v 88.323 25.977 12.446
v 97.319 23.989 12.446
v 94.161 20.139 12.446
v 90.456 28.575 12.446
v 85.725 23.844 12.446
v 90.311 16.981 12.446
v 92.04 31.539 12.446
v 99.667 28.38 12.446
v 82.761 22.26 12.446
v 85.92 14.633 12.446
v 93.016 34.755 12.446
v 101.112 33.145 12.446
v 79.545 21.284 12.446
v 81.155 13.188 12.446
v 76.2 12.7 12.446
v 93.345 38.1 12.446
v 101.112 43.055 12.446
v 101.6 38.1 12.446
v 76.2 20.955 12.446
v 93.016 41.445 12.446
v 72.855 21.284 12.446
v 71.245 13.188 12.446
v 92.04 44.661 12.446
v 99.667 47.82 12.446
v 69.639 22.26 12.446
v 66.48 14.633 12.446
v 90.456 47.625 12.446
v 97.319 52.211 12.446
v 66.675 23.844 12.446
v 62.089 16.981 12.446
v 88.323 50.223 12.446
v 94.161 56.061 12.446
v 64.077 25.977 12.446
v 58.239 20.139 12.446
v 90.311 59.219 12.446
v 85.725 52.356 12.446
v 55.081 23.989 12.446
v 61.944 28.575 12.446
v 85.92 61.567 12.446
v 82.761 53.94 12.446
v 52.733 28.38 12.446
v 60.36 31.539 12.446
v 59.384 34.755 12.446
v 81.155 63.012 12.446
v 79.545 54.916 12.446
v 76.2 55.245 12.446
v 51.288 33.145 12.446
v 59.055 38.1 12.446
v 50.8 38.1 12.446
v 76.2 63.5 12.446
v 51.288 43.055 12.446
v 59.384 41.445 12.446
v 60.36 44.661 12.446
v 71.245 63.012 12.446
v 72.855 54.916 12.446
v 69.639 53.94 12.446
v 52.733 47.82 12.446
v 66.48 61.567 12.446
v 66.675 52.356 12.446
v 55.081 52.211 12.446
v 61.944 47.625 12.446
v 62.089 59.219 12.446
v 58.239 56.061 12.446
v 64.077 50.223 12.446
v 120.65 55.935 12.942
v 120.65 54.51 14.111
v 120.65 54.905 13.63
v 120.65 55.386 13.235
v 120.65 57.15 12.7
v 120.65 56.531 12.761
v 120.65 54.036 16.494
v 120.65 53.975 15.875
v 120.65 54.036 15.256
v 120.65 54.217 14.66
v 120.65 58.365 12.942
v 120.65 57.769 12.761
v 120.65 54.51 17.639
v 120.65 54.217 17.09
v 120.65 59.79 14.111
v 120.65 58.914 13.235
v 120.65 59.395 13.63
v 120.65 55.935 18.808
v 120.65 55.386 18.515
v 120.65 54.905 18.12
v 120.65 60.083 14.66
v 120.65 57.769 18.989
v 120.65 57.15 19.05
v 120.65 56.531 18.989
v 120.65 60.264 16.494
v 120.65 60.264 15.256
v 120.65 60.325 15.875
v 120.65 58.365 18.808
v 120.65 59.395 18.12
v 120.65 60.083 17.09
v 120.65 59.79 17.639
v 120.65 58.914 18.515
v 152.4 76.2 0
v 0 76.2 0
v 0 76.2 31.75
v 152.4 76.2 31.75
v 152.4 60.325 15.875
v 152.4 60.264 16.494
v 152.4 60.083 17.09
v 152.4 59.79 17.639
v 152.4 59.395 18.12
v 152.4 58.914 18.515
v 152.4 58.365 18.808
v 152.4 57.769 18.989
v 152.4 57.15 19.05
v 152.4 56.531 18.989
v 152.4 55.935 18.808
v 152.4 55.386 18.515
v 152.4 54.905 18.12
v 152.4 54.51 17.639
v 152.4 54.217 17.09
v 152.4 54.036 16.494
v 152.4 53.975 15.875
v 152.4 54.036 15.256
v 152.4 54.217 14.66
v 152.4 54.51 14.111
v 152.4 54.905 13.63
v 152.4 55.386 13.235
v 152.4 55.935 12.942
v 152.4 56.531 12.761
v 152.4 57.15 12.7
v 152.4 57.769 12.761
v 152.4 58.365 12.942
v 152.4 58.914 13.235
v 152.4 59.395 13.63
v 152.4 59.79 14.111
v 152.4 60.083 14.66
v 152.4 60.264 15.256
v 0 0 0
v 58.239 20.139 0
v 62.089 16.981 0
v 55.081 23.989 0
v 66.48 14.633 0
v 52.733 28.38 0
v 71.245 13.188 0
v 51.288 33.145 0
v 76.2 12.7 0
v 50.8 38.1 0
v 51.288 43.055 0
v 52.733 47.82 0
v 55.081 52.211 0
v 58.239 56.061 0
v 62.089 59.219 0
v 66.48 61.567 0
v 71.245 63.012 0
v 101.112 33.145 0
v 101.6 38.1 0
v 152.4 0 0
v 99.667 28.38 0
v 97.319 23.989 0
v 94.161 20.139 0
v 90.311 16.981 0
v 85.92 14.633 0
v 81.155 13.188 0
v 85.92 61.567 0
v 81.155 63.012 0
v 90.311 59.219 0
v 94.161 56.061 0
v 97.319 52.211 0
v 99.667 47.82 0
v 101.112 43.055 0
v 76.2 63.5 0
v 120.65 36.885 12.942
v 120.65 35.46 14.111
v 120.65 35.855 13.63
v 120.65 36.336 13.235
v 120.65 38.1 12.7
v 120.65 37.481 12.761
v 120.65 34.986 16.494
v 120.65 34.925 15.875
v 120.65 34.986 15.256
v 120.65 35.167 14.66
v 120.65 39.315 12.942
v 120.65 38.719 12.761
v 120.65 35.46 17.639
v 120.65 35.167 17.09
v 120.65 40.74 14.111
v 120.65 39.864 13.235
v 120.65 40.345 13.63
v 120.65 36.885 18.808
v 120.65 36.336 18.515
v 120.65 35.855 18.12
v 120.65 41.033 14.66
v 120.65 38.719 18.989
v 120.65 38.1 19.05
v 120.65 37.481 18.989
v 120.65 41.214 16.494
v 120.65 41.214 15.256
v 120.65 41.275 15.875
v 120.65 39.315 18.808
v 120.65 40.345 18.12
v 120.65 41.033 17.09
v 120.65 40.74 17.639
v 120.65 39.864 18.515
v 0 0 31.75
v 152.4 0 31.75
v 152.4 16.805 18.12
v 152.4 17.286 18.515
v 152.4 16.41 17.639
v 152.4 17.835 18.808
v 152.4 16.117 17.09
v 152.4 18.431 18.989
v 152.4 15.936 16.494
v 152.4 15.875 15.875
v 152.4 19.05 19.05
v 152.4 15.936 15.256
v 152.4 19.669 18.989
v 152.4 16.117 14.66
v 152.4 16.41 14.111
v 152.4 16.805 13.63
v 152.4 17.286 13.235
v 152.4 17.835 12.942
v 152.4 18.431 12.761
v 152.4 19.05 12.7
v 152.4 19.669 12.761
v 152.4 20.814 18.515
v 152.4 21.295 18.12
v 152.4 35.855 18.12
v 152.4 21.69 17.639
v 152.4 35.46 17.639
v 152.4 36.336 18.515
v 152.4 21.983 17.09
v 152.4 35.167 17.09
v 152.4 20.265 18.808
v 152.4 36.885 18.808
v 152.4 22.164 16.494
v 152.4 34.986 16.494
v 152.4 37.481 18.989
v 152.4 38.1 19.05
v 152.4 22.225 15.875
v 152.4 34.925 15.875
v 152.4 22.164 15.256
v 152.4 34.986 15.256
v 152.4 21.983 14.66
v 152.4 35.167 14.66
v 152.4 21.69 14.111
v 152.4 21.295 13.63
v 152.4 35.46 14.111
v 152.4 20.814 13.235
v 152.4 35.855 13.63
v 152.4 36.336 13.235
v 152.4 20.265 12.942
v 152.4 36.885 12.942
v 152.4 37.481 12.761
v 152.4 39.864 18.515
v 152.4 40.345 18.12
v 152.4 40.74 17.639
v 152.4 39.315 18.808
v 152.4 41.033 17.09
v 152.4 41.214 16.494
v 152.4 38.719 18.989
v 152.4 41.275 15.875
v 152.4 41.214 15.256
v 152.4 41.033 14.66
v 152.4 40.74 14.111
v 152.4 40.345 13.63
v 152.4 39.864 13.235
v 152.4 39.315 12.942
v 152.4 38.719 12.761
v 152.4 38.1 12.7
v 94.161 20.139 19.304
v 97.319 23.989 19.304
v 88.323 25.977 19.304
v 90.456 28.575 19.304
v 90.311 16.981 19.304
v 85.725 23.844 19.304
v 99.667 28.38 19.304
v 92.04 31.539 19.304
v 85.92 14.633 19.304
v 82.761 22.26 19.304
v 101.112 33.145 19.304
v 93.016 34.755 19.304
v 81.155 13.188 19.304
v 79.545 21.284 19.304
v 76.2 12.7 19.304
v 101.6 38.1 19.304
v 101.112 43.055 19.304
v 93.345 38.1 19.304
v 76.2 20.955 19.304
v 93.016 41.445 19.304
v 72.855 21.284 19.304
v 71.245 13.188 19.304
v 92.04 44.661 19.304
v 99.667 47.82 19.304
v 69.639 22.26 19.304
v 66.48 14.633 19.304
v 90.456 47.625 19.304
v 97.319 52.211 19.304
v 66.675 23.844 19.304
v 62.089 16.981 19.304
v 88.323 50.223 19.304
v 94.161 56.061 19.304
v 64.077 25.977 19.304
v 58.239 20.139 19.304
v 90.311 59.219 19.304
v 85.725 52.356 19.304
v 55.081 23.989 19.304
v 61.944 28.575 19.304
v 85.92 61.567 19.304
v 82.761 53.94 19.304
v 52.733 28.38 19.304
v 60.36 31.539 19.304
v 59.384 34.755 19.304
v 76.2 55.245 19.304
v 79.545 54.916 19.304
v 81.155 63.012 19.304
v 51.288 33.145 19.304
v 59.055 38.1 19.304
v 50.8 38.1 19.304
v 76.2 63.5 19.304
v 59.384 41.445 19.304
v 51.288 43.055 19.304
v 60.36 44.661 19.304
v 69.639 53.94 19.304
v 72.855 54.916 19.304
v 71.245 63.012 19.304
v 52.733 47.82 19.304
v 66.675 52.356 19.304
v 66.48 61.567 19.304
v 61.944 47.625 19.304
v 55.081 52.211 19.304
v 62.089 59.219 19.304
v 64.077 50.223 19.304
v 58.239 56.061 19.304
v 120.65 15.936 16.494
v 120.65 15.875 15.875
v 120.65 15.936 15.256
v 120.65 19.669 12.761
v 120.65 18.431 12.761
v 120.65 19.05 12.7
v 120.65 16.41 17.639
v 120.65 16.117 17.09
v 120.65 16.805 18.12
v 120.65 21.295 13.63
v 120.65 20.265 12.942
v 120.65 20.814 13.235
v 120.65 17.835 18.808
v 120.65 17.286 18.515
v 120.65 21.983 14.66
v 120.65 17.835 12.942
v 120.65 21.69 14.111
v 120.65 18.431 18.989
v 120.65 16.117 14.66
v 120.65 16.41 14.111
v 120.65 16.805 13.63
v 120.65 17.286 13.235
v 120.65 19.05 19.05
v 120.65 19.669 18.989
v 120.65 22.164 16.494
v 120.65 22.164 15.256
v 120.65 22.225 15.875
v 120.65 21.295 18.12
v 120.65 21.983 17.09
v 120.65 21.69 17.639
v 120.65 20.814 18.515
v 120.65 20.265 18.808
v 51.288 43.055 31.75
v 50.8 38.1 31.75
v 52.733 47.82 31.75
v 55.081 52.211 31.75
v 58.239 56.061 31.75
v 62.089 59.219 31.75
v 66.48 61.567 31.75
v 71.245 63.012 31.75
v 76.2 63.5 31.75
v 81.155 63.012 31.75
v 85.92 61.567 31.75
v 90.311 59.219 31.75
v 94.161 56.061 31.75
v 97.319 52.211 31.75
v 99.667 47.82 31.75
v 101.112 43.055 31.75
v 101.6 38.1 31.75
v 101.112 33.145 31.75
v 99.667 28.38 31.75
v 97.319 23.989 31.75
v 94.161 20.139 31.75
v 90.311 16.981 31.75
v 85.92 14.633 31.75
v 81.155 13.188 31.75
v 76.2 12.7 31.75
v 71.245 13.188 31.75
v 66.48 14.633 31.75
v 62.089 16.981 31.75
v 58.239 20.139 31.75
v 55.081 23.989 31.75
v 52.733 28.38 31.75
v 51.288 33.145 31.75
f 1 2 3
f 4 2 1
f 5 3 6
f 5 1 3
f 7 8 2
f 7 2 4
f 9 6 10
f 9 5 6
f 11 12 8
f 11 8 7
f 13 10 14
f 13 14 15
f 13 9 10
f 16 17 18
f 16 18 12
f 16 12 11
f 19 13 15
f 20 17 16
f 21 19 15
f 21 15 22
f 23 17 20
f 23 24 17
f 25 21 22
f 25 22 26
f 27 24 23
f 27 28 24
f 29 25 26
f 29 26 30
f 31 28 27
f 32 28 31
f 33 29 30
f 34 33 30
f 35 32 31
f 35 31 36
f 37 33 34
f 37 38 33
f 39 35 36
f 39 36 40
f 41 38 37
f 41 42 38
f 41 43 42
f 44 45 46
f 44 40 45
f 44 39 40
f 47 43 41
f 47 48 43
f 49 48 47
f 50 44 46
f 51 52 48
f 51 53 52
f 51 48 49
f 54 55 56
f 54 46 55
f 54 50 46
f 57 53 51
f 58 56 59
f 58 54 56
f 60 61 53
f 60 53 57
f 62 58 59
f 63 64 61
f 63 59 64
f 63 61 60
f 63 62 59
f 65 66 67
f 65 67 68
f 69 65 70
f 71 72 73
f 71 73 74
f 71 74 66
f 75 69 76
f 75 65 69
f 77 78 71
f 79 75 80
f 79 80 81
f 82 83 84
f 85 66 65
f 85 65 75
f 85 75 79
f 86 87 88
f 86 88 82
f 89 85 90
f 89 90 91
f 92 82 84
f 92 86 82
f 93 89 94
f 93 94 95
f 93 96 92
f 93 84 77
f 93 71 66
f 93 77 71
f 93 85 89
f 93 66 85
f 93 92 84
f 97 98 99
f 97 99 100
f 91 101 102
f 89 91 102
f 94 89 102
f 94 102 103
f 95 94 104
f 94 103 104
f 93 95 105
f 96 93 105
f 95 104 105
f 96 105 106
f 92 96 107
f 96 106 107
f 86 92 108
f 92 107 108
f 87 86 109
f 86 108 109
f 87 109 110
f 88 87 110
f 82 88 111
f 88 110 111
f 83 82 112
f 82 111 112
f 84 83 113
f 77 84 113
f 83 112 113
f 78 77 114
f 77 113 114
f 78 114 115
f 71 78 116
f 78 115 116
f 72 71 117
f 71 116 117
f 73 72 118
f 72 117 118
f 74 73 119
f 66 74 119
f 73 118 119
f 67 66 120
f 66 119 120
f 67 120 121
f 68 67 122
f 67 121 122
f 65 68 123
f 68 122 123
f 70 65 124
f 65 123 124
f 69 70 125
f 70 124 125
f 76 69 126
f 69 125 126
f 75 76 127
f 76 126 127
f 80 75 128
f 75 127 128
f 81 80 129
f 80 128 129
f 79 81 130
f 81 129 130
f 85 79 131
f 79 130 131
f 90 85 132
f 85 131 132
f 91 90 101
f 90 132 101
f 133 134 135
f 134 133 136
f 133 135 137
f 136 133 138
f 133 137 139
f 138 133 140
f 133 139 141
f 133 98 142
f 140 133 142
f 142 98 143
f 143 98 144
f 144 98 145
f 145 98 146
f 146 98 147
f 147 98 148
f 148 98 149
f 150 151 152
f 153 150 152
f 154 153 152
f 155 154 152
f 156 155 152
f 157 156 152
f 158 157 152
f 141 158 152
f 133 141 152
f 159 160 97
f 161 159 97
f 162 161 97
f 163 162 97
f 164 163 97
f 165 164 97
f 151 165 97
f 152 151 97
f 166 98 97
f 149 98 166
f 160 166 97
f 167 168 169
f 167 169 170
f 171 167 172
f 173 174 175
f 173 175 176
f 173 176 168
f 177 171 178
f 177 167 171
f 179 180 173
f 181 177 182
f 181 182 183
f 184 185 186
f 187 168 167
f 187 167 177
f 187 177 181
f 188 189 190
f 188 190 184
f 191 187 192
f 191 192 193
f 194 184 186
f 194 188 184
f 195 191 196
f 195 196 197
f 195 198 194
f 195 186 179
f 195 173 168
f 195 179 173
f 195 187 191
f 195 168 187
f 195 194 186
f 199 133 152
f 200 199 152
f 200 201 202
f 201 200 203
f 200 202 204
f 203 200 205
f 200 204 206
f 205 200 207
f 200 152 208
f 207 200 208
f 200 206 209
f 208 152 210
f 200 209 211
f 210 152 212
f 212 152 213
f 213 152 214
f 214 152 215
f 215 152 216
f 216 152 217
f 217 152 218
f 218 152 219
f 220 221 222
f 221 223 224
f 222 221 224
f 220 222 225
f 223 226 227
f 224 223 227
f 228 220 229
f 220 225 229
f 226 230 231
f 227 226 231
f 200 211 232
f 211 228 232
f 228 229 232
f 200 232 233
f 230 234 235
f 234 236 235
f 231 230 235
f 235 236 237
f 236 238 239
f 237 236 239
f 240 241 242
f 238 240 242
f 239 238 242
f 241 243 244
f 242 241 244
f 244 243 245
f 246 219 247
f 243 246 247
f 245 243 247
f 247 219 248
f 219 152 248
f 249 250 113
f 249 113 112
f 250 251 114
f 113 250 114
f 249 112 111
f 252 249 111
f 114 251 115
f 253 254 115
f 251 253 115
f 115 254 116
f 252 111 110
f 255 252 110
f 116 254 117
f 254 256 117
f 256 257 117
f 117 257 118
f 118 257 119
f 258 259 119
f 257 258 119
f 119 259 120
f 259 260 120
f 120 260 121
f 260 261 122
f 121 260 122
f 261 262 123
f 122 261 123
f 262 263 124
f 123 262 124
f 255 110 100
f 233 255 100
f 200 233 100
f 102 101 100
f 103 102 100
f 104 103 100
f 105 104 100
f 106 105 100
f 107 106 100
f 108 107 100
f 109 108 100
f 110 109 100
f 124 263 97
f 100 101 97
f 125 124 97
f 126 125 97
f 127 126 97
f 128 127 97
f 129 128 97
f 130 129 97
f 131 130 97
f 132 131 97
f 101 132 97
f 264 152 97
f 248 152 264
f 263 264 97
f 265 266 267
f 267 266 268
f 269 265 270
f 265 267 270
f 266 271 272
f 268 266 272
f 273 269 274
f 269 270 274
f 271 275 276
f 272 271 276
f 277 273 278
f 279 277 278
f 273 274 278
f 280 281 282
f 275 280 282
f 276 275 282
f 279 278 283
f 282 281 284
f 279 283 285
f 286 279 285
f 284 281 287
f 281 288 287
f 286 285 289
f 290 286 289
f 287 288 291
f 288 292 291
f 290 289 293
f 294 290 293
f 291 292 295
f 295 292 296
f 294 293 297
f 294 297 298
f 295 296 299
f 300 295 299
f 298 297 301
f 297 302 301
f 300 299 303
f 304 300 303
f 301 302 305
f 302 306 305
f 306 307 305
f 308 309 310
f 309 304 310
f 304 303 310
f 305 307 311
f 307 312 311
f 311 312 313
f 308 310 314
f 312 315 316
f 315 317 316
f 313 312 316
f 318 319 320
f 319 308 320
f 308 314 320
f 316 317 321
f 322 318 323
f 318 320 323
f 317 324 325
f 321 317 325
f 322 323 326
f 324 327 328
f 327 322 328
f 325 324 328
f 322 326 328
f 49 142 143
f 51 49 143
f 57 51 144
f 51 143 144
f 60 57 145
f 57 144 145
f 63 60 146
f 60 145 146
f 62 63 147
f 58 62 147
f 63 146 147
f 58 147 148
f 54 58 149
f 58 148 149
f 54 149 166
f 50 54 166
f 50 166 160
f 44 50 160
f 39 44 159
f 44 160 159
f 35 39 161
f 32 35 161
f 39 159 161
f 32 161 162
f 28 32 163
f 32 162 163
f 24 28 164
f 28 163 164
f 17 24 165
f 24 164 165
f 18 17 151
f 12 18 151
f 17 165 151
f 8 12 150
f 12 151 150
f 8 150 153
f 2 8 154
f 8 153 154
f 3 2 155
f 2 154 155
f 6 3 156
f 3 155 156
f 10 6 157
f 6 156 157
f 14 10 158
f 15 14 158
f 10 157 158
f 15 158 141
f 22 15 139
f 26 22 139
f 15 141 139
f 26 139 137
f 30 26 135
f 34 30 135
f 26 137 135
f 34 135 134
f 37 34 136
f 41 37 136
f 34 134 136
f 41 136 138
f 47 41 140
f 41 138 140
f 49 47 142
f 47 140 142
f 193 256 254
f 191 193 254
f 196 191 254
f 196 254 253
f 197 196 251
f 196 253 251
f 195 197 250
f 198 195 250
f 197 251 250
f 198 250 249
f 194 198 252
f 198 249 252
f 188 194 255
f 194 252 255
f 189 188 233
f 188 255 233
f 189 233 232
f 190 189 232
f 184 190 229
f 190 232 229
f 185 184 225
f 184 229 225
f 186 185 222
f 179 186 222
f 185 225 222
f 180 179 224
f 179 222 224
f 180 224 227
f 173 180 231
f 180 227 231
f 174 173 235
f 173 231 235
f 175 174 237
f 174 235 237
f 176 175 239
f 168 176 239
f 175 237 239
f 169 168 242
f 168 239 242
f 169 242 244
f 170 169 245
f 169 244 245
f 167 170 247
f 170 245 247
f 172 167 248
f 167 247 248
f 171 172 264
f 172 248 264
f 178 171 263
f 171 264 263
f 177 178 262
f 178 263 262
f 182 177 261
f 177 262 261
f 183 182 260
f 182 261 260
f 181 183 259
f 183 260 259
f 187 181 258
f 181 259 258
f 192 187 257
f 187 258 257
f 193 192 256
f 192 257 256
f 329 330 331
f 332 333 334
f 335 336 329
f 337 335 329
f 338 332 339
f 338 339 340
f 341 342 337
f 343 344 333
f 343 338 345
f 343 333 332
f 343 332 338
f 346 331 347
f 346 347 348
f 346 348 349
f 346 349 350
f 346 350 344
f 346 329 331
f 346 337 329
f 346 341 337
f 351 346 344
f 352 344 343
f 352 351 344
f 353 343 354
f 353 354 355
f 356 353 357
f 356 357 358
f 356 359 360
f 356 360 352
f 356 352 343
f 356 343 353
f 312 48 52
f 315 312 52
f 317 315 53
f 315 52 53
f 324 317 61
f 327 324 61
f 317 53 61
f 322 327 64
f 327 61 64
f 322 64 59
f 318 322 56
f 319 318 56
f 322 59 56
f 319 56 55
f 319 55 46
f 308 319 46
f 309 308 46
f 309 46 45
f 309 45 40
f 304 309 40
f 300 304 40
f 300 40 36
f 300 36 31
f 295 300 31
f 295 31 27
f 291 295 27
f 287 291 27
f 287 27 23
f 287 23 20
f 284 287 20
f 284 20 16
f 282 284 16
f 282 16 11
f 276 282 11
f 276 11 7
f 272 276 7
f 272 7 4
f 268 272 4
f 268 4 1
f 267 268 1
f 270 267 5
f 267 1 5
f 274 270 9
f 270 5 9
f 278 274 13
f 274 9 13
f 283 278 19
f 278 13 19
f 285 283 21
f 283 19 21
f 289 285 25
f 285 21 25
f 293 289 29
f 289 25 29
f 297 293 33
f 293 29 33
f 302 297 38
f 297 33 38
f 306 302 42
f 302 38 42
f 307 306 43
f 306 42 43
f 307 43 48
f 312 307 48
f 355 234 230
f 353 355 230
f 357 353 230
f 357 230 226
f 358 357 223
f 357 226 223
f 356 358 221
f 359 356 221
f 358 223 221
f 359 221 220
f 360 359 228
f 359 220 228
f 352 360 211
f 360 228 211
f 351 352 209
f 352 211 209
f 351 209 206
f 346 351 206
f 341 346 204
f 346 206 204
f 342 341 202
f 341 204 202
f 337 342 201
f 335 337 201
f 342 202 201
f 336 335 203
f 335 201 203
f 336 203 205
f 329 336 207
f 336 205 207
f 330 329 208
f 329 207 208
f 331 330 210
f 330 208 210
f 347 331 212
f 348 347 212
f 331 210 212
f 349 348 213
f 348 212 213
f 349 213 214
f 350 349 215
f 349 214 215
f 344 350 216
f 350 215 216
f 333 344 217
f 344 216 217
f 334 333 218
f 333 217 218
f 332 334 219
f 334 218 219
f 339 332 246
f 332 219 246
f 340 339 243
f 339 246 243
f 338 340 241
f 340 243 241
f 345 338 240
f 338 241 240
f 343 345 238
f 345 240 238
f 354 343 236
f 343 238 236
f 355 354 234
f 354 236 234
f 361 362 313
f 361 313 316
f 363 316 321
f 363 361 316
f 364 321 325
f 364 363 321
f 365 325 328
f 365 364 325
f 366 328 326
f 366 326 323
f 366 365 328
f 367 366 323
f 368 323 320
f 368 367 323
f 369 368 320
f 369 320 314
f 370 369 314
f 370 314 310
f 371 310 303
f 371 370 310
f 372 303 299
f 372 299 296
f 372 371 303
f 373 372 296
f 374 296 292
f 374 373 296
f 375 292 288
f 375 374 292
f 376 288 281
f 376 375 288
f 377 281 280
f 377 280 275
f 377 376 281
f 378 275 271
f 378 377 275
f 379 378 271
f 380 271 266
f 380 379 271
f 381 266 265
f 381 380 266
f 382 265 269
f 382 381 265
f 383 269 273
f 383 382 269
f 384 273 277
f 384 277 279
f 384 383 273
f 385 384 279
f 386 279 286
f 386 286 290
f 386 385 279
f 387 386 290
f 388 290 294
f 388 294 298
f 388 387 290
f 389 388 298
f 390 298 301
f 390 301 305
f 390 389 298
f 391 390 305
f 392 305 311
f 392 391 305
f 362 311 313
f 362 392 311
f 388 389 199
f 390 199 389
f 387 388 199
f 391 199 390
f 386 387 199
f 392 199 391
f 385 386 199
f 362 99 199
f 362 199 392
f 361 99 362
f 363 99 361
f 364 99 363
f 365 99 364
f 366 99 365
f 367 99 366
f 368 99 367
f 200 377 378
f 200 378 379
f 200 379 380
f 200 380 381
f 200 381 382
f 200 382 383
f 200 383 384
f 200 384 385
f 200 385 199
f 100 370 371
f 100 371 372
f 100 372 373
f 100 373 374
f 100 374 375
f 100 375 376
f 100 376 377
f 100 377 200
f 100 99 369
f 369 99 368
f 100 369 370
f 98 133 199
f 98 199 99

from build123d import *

# Parameters (mm, degrees)
SKETCH1_W           = 152.4
SKETCH1_H           = 76.2
BOSS_EXTRUDE1_DEPTH = 31.75
SKETCH2_R           = 17.145
CUT_EXTRUDE1_DEPTH  = 174.321269612
SKETCH2_2_R         = 25.4
SKETCH2_2_R_2       = 17.145
CUT_EXTRUDE3_DEPTH  = 12.446
SKETCH3_R           = 3.175
CUT_EXTRUDE4_DEPTH  = 31.75


with BuildPart() as part:
    # Sketch1 → Boss-Extrude1 (new body)
    with BuildSketch(Plane.XY):
        with Locations((76.2, 38.1)):
            Rectangle(SKETCH1_W, SKETCH1_H)
    extrude(amount=BOSS_EXTRUDE1_DEPTH)

    # Sketch2 → Cut-Extrude1 (cut, through all)
    with BuildSketch(Plane(origin=(0, 0, 0), x_dir=(-1, 0, 0), z_dir=(0, 0, -1))):
        with Locations((-76.2, 38.1)):
            Circle(SKETCH2_R)
    extrude(amount=-CUT_EXTRUDE1_DEPTH, mode=Mode.SUBTRACT)

    # Sketch2<2> → Cut-Extrude3 (cut)
    with BuildSketch(Plane(origin=(0, 0, 0), x_dir=(-1, 0, 0), z_dir=(0, 0, -1))):
        with Locations((-76.2, 38.1)):
            Circle(SKETCH2_2_R)
        with Locations((-76.2, 38.1)):
            Circle(SKETCH2_2_R_2, mode=Mode.SUBTRACT)
    cut_extrude3 = extrude(amount=-CUT_EXTRUDE3_DEPTH, mode=Mode.SUBTRACT)

    # Mirror2: Cut-Extrude3 across plane
    add(cut_extrude3.mirror(Plane(origin=(0, 0, 15.875), x_dir=(1, 0, 0), z_dir=(0, 0, -1))), mode=Mode.SUBTRACT)

    # Sketch3 → Cut-Extrude4 (cut)
    with BuildSketch(Plane(origin=(152.4, 0, 0), x_dir=(0, 0, -1), z_dir=(1, 0, 0))):
        with Locations((-15.875, 57.15)):
            Circle(SKETCH3_R)
        with Locations((-15.875, 19.05)):
            Circle(SKETCH3_R)
        with Locations((-15.875, 38.1)):
            Circle(SKETCH3_R)
    extrude(amount=-CUT_EXTRUDE4_DEPTH, mode=Mode.SUBTRACT)


solid = part.part
